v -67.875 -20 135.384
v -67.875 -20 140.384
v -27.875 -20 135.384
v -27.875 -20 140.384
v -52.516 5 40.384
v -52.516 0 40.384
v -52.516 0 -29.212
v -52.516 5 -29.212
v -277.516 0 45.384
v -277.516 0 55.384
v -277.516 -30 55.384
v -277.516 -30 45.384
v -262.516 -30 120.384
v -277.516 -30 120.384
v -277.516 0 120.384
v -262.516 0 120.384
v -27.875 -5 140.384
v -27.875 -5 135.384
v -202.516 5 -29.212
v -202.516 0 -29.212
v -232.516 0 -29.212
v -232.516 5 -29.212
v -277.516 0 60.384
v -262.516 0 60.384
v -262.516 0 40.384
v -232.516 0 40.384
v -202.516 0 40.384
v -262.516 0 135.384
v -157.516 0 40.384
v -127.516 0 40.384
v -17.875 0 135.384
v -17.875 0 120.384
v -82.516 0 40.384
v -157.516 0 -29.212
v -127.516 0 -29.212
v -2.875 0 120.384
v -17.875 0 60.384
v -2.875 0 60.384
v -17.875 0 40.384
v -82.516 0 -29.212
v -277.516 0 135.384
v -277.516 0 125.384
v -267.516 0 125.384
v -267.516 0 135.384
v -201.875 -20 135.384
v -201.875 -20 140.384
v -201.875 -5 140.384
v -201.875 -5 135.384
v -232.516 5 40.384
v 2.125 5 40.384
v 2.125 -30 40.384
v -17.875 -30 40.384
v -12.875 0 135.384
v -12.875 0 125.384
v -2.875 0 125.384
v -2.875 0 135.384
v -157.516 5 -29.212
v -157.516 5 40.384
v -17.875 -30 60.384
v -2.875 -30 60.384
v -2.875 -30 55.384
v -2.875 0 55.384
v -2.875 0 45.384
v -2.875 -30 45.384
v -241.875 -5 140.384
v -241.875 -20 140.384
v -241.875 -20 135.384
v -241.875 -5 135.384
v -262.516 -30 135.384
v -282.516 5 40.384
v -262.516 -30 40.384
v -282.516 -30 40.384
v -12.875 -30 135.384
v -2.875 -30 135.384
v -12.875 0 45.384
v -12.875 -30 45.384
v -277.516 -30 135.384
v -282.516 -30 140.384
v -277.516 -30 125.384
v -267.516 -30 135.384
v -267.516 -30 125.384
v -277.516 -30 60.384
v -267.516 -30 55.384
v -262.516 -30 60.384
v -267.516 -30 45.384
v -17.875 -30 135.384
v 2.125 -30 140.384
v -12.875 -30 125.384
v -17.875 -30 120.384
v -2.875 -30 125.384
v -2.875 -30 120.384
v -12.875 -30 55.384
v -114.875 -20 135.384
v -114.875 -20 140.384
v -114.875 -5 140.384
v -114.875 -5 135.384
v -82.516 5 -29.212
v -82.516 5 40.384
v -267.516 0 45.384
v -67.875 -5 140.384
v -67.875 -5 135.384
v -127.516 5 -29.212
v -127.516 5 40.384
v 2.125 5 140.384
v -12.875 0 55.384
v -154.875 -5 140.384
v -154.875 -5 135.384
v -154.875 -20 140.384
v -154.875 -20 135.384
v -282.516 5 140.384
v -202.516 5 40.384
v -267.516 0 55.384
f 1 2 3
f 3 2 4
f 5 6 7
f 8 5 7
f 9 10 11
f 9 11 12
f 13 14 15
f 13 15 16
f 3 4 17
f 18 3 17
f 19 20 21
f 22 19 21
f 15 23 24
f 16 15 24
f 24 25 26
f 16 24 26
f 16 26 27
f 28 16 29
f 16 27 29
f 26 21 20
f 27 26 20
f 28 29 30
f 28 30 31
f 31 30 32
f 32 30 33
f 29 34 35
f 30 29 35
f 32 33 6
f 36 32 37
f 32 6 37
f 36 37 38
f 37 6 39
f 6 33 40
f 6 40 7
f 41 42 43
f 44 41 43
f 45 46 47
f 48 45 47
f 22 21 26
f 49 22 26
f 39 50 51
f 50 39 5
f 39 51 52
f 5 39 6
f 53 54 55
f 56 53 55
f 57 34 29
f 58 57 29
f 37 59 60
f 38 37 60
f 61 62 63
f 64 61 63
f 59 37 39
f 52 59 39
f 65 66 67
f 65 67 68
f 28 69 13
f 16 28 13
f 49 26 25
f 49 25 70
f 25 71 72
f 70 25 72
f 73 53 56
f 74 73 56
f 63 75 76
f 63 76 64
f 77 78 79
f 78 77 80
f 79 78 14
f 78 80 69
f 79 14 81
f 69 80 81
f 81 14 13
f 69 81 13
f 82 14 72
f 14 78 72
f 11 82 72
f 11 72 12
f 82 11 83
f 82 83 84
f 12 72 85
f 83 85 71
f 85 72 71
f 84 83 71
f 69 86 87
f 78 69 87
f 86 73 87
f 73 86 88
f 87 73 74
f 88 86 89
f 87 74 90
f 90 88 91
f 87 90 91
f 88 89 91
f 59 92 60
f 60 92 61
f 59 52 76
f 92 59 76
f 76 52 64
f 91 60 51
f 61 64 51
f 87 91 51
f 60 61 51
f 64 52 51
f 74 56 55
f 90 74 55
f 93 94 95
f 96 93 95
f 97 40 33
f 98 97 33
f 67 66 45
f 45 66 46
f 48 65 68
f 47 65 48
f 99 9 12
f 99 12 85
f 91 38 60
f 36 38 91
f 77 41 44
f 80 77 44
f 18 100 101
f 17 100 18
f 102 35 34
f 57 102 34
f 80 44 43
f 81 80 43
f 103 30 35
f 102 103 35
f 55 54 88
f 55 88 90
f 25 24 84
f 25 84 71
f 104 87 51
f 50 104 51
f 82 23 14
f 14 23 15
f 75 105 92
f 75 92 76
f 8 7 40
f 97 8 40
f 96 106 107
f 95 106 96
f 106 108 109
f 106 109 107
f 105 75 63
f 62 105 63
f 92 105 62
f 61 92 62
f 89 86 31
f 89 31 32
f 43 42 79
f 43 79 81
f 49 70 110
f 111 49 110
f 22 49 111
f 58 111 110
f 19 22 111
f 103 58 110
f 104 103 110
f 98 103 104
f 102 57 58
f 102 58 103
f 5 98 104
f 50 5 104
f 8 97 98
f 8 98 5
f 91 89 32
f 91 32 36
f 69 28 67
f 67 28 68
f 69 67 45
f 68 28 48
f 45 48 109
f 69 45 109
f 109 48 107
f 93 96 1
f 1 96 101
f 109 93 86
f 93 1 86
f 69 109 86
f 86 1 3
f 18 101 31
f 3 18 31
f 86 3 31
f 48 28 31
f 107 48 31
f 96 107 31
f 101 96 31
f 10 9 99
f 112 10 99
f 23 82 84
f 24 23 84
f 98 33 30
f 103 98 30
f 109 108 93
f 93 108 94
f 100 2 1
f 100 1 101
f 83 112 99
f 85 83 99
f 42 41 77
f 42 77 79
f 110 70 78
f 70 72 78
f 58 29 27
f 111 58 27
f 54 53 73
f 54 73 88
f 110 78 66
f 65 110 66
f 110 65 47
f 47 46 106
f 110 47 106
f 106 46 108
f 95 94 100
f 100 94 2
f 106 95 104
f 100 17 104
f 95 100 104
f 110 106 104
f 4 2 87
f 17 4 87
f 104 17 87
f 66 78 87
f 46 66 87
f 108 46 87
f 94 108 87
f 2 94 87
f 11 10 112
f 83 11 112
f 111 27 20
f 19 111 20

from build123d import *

# Parameters (mm, degrees)
EXTRUDE_1_DEPTH     = 5
SKETCH_4_W          = 20
SKETCH_4_H          = 20
SKETCH_4_W_2        = 10
SKETCH_4_H_2        = 10
EXTRUDE_2_DEPTH     = 35
SKETCH_5_W          = 244.874710442
SKETCH_5_H          = 5
SKETCH_5_W_2        = 5
SKETCH_5_H_2        = 60
EXTRUDE_3_DEPTH     = 30
SKETCH_7_W          = 40
SKETCH_7_H          = 15
CUT_EXTRUDE_2_DEPTH = 5


with BuildPart() as part:
    # 草图2 → 凸台-拉伸1 (new body)
    with BuildSketch(Plane(origin=(0, 0, 0), x_dir=(1, 0, 0), z_dir=(0, 1, 0))):
        Polygon((-232.515561992, 29.211958859), (-232.515561992, -40.383972047), (-282.515561992, -40.383972047), (-282.515561992, -140.383972047), (2.125454159, -140.383972047), (2.125454159, -40.383972047), (-52.515561992, -40.383972047), (-52.515561992, 29.211958859), (-82.515561992, 29.211958859), (-82.515561992, -40.383972047), (-127.515561992, -40.383972047), (-127.515561992, 29.211958859), (-157.515561992, 29.211958859), (-157.515561992, -40.383972047), (-202.515561992, -40.383972047), (-202.515561992, 29.211958859), align=None)
    extrude(amount=EXTRUDE_1_DEPTH)

    # 草图4 → 凸台-拉伸2 (add)
    # profile 1 of 4: a face of its own
    with BuildSketch(Plane(origin=(0, 5, 0), x_dir=(1, 0, 0), z_dir=(0, 1, 0))):
        with Locations((-272.515561992, -50.383972047)):
            Rectangle(SKETCH_4_W, SKETCH_4_H)
        with Locations((-272.515561992, -50.383972047)):
            Rectangle(SKETCH_4_W_2, SKETCH_4_H_2, mode=Mode.SUBTRACT)
    # profile 2 of 4: a face of its own
    with BuildSketch(Plane(origin=(0, 5, 0), x_dir=(1, 0, 0), z_dir=(0, 1, 0))):
        with Locations((-272.515561992, -130.383972047)):
            Rectangle(SKETCH_4_W, SKETCH_4_H)
        with Locations((-272.515561992, -130.383972047)):
            Rectangle(SKETCH_4_W_2, SKETCH_4_H_2, mode=Mode.SUBTRACT)
    # profile 3 of 4: a face of its own
    with BuildSketch(Plane(origin=(0, 5, 0), x_dir=(1, 0, 0), z_dir=(0, 1, 0))):
        with Locations((-7.874545841, -50.383972047)):
            Rectangle(SKETCH_4_W, SKETCH_4_H)
        with Locations((-7.874545841, -50.383972047)):
            Rectangle(SKETCH_4_W_2, SKETCH_4_H_2, mode=Mode.SUBTRACT)
    # profile 4 of 4: a face of its own
    with BuildSketch(Plane(origin=(0, 5, 0), x_dir=(1, 0, 0), z_dir=(0, 1, 0))):
        with Locations((-7.874545841, -130.383972047)):
            Rectangle(SKETCH_4_W, SKETCH_4_H)
        with Locations((-7.874545841, -130.383972047)):
            Rectangle(SKETCH_4_W_2, SKETCH_4_H_2, mode=Mode.SUBTRACT)
    extrude(amount=-EXTRUDE_2_DEPTH)

    # 草图5 → 凸台-拉伸3 (add)
    with BuildSketch(Plane.XZ):
        with Locations((-140.311901062, 137.883972047)):
            Rectangle(SKETCH_5_W, SKETCH_5_H)
        with Locations((-280.015561992, 90.383972047)):
            Rectangle(SKETCH_5_W_2, SKETCH_5_H_2)
        with Locations((-0.374545841, 90.383972047)):
            Rectangle(SKETCH_5_W_2, SKETCH_5_H_2)
    extrude(amount=EXTRUDE_3_DEPTH)

    # 草图7 → 切除-拉伸2 (cut)
    with BuildSketch(Plane.XY.offset(140.383972047)):
        with Locations((-134.874545841, -12.5)):
            Rectangle(SKETCH_7_W, SKETCH_7_H)
        with Locations((-47.874545841, -12.5)):
            Rectangle(SKETCH_7_W, SKETCH_7_H)
        with Locations((-221.874545841, -12.5)):
            Rectangle(SKETCH_7_W, SKETCH_7_H)
    extrude(amount=-CUT_EXTRUDE_2_DEPTH, mode=Mode.SUBTRACT)


solid = part.part
